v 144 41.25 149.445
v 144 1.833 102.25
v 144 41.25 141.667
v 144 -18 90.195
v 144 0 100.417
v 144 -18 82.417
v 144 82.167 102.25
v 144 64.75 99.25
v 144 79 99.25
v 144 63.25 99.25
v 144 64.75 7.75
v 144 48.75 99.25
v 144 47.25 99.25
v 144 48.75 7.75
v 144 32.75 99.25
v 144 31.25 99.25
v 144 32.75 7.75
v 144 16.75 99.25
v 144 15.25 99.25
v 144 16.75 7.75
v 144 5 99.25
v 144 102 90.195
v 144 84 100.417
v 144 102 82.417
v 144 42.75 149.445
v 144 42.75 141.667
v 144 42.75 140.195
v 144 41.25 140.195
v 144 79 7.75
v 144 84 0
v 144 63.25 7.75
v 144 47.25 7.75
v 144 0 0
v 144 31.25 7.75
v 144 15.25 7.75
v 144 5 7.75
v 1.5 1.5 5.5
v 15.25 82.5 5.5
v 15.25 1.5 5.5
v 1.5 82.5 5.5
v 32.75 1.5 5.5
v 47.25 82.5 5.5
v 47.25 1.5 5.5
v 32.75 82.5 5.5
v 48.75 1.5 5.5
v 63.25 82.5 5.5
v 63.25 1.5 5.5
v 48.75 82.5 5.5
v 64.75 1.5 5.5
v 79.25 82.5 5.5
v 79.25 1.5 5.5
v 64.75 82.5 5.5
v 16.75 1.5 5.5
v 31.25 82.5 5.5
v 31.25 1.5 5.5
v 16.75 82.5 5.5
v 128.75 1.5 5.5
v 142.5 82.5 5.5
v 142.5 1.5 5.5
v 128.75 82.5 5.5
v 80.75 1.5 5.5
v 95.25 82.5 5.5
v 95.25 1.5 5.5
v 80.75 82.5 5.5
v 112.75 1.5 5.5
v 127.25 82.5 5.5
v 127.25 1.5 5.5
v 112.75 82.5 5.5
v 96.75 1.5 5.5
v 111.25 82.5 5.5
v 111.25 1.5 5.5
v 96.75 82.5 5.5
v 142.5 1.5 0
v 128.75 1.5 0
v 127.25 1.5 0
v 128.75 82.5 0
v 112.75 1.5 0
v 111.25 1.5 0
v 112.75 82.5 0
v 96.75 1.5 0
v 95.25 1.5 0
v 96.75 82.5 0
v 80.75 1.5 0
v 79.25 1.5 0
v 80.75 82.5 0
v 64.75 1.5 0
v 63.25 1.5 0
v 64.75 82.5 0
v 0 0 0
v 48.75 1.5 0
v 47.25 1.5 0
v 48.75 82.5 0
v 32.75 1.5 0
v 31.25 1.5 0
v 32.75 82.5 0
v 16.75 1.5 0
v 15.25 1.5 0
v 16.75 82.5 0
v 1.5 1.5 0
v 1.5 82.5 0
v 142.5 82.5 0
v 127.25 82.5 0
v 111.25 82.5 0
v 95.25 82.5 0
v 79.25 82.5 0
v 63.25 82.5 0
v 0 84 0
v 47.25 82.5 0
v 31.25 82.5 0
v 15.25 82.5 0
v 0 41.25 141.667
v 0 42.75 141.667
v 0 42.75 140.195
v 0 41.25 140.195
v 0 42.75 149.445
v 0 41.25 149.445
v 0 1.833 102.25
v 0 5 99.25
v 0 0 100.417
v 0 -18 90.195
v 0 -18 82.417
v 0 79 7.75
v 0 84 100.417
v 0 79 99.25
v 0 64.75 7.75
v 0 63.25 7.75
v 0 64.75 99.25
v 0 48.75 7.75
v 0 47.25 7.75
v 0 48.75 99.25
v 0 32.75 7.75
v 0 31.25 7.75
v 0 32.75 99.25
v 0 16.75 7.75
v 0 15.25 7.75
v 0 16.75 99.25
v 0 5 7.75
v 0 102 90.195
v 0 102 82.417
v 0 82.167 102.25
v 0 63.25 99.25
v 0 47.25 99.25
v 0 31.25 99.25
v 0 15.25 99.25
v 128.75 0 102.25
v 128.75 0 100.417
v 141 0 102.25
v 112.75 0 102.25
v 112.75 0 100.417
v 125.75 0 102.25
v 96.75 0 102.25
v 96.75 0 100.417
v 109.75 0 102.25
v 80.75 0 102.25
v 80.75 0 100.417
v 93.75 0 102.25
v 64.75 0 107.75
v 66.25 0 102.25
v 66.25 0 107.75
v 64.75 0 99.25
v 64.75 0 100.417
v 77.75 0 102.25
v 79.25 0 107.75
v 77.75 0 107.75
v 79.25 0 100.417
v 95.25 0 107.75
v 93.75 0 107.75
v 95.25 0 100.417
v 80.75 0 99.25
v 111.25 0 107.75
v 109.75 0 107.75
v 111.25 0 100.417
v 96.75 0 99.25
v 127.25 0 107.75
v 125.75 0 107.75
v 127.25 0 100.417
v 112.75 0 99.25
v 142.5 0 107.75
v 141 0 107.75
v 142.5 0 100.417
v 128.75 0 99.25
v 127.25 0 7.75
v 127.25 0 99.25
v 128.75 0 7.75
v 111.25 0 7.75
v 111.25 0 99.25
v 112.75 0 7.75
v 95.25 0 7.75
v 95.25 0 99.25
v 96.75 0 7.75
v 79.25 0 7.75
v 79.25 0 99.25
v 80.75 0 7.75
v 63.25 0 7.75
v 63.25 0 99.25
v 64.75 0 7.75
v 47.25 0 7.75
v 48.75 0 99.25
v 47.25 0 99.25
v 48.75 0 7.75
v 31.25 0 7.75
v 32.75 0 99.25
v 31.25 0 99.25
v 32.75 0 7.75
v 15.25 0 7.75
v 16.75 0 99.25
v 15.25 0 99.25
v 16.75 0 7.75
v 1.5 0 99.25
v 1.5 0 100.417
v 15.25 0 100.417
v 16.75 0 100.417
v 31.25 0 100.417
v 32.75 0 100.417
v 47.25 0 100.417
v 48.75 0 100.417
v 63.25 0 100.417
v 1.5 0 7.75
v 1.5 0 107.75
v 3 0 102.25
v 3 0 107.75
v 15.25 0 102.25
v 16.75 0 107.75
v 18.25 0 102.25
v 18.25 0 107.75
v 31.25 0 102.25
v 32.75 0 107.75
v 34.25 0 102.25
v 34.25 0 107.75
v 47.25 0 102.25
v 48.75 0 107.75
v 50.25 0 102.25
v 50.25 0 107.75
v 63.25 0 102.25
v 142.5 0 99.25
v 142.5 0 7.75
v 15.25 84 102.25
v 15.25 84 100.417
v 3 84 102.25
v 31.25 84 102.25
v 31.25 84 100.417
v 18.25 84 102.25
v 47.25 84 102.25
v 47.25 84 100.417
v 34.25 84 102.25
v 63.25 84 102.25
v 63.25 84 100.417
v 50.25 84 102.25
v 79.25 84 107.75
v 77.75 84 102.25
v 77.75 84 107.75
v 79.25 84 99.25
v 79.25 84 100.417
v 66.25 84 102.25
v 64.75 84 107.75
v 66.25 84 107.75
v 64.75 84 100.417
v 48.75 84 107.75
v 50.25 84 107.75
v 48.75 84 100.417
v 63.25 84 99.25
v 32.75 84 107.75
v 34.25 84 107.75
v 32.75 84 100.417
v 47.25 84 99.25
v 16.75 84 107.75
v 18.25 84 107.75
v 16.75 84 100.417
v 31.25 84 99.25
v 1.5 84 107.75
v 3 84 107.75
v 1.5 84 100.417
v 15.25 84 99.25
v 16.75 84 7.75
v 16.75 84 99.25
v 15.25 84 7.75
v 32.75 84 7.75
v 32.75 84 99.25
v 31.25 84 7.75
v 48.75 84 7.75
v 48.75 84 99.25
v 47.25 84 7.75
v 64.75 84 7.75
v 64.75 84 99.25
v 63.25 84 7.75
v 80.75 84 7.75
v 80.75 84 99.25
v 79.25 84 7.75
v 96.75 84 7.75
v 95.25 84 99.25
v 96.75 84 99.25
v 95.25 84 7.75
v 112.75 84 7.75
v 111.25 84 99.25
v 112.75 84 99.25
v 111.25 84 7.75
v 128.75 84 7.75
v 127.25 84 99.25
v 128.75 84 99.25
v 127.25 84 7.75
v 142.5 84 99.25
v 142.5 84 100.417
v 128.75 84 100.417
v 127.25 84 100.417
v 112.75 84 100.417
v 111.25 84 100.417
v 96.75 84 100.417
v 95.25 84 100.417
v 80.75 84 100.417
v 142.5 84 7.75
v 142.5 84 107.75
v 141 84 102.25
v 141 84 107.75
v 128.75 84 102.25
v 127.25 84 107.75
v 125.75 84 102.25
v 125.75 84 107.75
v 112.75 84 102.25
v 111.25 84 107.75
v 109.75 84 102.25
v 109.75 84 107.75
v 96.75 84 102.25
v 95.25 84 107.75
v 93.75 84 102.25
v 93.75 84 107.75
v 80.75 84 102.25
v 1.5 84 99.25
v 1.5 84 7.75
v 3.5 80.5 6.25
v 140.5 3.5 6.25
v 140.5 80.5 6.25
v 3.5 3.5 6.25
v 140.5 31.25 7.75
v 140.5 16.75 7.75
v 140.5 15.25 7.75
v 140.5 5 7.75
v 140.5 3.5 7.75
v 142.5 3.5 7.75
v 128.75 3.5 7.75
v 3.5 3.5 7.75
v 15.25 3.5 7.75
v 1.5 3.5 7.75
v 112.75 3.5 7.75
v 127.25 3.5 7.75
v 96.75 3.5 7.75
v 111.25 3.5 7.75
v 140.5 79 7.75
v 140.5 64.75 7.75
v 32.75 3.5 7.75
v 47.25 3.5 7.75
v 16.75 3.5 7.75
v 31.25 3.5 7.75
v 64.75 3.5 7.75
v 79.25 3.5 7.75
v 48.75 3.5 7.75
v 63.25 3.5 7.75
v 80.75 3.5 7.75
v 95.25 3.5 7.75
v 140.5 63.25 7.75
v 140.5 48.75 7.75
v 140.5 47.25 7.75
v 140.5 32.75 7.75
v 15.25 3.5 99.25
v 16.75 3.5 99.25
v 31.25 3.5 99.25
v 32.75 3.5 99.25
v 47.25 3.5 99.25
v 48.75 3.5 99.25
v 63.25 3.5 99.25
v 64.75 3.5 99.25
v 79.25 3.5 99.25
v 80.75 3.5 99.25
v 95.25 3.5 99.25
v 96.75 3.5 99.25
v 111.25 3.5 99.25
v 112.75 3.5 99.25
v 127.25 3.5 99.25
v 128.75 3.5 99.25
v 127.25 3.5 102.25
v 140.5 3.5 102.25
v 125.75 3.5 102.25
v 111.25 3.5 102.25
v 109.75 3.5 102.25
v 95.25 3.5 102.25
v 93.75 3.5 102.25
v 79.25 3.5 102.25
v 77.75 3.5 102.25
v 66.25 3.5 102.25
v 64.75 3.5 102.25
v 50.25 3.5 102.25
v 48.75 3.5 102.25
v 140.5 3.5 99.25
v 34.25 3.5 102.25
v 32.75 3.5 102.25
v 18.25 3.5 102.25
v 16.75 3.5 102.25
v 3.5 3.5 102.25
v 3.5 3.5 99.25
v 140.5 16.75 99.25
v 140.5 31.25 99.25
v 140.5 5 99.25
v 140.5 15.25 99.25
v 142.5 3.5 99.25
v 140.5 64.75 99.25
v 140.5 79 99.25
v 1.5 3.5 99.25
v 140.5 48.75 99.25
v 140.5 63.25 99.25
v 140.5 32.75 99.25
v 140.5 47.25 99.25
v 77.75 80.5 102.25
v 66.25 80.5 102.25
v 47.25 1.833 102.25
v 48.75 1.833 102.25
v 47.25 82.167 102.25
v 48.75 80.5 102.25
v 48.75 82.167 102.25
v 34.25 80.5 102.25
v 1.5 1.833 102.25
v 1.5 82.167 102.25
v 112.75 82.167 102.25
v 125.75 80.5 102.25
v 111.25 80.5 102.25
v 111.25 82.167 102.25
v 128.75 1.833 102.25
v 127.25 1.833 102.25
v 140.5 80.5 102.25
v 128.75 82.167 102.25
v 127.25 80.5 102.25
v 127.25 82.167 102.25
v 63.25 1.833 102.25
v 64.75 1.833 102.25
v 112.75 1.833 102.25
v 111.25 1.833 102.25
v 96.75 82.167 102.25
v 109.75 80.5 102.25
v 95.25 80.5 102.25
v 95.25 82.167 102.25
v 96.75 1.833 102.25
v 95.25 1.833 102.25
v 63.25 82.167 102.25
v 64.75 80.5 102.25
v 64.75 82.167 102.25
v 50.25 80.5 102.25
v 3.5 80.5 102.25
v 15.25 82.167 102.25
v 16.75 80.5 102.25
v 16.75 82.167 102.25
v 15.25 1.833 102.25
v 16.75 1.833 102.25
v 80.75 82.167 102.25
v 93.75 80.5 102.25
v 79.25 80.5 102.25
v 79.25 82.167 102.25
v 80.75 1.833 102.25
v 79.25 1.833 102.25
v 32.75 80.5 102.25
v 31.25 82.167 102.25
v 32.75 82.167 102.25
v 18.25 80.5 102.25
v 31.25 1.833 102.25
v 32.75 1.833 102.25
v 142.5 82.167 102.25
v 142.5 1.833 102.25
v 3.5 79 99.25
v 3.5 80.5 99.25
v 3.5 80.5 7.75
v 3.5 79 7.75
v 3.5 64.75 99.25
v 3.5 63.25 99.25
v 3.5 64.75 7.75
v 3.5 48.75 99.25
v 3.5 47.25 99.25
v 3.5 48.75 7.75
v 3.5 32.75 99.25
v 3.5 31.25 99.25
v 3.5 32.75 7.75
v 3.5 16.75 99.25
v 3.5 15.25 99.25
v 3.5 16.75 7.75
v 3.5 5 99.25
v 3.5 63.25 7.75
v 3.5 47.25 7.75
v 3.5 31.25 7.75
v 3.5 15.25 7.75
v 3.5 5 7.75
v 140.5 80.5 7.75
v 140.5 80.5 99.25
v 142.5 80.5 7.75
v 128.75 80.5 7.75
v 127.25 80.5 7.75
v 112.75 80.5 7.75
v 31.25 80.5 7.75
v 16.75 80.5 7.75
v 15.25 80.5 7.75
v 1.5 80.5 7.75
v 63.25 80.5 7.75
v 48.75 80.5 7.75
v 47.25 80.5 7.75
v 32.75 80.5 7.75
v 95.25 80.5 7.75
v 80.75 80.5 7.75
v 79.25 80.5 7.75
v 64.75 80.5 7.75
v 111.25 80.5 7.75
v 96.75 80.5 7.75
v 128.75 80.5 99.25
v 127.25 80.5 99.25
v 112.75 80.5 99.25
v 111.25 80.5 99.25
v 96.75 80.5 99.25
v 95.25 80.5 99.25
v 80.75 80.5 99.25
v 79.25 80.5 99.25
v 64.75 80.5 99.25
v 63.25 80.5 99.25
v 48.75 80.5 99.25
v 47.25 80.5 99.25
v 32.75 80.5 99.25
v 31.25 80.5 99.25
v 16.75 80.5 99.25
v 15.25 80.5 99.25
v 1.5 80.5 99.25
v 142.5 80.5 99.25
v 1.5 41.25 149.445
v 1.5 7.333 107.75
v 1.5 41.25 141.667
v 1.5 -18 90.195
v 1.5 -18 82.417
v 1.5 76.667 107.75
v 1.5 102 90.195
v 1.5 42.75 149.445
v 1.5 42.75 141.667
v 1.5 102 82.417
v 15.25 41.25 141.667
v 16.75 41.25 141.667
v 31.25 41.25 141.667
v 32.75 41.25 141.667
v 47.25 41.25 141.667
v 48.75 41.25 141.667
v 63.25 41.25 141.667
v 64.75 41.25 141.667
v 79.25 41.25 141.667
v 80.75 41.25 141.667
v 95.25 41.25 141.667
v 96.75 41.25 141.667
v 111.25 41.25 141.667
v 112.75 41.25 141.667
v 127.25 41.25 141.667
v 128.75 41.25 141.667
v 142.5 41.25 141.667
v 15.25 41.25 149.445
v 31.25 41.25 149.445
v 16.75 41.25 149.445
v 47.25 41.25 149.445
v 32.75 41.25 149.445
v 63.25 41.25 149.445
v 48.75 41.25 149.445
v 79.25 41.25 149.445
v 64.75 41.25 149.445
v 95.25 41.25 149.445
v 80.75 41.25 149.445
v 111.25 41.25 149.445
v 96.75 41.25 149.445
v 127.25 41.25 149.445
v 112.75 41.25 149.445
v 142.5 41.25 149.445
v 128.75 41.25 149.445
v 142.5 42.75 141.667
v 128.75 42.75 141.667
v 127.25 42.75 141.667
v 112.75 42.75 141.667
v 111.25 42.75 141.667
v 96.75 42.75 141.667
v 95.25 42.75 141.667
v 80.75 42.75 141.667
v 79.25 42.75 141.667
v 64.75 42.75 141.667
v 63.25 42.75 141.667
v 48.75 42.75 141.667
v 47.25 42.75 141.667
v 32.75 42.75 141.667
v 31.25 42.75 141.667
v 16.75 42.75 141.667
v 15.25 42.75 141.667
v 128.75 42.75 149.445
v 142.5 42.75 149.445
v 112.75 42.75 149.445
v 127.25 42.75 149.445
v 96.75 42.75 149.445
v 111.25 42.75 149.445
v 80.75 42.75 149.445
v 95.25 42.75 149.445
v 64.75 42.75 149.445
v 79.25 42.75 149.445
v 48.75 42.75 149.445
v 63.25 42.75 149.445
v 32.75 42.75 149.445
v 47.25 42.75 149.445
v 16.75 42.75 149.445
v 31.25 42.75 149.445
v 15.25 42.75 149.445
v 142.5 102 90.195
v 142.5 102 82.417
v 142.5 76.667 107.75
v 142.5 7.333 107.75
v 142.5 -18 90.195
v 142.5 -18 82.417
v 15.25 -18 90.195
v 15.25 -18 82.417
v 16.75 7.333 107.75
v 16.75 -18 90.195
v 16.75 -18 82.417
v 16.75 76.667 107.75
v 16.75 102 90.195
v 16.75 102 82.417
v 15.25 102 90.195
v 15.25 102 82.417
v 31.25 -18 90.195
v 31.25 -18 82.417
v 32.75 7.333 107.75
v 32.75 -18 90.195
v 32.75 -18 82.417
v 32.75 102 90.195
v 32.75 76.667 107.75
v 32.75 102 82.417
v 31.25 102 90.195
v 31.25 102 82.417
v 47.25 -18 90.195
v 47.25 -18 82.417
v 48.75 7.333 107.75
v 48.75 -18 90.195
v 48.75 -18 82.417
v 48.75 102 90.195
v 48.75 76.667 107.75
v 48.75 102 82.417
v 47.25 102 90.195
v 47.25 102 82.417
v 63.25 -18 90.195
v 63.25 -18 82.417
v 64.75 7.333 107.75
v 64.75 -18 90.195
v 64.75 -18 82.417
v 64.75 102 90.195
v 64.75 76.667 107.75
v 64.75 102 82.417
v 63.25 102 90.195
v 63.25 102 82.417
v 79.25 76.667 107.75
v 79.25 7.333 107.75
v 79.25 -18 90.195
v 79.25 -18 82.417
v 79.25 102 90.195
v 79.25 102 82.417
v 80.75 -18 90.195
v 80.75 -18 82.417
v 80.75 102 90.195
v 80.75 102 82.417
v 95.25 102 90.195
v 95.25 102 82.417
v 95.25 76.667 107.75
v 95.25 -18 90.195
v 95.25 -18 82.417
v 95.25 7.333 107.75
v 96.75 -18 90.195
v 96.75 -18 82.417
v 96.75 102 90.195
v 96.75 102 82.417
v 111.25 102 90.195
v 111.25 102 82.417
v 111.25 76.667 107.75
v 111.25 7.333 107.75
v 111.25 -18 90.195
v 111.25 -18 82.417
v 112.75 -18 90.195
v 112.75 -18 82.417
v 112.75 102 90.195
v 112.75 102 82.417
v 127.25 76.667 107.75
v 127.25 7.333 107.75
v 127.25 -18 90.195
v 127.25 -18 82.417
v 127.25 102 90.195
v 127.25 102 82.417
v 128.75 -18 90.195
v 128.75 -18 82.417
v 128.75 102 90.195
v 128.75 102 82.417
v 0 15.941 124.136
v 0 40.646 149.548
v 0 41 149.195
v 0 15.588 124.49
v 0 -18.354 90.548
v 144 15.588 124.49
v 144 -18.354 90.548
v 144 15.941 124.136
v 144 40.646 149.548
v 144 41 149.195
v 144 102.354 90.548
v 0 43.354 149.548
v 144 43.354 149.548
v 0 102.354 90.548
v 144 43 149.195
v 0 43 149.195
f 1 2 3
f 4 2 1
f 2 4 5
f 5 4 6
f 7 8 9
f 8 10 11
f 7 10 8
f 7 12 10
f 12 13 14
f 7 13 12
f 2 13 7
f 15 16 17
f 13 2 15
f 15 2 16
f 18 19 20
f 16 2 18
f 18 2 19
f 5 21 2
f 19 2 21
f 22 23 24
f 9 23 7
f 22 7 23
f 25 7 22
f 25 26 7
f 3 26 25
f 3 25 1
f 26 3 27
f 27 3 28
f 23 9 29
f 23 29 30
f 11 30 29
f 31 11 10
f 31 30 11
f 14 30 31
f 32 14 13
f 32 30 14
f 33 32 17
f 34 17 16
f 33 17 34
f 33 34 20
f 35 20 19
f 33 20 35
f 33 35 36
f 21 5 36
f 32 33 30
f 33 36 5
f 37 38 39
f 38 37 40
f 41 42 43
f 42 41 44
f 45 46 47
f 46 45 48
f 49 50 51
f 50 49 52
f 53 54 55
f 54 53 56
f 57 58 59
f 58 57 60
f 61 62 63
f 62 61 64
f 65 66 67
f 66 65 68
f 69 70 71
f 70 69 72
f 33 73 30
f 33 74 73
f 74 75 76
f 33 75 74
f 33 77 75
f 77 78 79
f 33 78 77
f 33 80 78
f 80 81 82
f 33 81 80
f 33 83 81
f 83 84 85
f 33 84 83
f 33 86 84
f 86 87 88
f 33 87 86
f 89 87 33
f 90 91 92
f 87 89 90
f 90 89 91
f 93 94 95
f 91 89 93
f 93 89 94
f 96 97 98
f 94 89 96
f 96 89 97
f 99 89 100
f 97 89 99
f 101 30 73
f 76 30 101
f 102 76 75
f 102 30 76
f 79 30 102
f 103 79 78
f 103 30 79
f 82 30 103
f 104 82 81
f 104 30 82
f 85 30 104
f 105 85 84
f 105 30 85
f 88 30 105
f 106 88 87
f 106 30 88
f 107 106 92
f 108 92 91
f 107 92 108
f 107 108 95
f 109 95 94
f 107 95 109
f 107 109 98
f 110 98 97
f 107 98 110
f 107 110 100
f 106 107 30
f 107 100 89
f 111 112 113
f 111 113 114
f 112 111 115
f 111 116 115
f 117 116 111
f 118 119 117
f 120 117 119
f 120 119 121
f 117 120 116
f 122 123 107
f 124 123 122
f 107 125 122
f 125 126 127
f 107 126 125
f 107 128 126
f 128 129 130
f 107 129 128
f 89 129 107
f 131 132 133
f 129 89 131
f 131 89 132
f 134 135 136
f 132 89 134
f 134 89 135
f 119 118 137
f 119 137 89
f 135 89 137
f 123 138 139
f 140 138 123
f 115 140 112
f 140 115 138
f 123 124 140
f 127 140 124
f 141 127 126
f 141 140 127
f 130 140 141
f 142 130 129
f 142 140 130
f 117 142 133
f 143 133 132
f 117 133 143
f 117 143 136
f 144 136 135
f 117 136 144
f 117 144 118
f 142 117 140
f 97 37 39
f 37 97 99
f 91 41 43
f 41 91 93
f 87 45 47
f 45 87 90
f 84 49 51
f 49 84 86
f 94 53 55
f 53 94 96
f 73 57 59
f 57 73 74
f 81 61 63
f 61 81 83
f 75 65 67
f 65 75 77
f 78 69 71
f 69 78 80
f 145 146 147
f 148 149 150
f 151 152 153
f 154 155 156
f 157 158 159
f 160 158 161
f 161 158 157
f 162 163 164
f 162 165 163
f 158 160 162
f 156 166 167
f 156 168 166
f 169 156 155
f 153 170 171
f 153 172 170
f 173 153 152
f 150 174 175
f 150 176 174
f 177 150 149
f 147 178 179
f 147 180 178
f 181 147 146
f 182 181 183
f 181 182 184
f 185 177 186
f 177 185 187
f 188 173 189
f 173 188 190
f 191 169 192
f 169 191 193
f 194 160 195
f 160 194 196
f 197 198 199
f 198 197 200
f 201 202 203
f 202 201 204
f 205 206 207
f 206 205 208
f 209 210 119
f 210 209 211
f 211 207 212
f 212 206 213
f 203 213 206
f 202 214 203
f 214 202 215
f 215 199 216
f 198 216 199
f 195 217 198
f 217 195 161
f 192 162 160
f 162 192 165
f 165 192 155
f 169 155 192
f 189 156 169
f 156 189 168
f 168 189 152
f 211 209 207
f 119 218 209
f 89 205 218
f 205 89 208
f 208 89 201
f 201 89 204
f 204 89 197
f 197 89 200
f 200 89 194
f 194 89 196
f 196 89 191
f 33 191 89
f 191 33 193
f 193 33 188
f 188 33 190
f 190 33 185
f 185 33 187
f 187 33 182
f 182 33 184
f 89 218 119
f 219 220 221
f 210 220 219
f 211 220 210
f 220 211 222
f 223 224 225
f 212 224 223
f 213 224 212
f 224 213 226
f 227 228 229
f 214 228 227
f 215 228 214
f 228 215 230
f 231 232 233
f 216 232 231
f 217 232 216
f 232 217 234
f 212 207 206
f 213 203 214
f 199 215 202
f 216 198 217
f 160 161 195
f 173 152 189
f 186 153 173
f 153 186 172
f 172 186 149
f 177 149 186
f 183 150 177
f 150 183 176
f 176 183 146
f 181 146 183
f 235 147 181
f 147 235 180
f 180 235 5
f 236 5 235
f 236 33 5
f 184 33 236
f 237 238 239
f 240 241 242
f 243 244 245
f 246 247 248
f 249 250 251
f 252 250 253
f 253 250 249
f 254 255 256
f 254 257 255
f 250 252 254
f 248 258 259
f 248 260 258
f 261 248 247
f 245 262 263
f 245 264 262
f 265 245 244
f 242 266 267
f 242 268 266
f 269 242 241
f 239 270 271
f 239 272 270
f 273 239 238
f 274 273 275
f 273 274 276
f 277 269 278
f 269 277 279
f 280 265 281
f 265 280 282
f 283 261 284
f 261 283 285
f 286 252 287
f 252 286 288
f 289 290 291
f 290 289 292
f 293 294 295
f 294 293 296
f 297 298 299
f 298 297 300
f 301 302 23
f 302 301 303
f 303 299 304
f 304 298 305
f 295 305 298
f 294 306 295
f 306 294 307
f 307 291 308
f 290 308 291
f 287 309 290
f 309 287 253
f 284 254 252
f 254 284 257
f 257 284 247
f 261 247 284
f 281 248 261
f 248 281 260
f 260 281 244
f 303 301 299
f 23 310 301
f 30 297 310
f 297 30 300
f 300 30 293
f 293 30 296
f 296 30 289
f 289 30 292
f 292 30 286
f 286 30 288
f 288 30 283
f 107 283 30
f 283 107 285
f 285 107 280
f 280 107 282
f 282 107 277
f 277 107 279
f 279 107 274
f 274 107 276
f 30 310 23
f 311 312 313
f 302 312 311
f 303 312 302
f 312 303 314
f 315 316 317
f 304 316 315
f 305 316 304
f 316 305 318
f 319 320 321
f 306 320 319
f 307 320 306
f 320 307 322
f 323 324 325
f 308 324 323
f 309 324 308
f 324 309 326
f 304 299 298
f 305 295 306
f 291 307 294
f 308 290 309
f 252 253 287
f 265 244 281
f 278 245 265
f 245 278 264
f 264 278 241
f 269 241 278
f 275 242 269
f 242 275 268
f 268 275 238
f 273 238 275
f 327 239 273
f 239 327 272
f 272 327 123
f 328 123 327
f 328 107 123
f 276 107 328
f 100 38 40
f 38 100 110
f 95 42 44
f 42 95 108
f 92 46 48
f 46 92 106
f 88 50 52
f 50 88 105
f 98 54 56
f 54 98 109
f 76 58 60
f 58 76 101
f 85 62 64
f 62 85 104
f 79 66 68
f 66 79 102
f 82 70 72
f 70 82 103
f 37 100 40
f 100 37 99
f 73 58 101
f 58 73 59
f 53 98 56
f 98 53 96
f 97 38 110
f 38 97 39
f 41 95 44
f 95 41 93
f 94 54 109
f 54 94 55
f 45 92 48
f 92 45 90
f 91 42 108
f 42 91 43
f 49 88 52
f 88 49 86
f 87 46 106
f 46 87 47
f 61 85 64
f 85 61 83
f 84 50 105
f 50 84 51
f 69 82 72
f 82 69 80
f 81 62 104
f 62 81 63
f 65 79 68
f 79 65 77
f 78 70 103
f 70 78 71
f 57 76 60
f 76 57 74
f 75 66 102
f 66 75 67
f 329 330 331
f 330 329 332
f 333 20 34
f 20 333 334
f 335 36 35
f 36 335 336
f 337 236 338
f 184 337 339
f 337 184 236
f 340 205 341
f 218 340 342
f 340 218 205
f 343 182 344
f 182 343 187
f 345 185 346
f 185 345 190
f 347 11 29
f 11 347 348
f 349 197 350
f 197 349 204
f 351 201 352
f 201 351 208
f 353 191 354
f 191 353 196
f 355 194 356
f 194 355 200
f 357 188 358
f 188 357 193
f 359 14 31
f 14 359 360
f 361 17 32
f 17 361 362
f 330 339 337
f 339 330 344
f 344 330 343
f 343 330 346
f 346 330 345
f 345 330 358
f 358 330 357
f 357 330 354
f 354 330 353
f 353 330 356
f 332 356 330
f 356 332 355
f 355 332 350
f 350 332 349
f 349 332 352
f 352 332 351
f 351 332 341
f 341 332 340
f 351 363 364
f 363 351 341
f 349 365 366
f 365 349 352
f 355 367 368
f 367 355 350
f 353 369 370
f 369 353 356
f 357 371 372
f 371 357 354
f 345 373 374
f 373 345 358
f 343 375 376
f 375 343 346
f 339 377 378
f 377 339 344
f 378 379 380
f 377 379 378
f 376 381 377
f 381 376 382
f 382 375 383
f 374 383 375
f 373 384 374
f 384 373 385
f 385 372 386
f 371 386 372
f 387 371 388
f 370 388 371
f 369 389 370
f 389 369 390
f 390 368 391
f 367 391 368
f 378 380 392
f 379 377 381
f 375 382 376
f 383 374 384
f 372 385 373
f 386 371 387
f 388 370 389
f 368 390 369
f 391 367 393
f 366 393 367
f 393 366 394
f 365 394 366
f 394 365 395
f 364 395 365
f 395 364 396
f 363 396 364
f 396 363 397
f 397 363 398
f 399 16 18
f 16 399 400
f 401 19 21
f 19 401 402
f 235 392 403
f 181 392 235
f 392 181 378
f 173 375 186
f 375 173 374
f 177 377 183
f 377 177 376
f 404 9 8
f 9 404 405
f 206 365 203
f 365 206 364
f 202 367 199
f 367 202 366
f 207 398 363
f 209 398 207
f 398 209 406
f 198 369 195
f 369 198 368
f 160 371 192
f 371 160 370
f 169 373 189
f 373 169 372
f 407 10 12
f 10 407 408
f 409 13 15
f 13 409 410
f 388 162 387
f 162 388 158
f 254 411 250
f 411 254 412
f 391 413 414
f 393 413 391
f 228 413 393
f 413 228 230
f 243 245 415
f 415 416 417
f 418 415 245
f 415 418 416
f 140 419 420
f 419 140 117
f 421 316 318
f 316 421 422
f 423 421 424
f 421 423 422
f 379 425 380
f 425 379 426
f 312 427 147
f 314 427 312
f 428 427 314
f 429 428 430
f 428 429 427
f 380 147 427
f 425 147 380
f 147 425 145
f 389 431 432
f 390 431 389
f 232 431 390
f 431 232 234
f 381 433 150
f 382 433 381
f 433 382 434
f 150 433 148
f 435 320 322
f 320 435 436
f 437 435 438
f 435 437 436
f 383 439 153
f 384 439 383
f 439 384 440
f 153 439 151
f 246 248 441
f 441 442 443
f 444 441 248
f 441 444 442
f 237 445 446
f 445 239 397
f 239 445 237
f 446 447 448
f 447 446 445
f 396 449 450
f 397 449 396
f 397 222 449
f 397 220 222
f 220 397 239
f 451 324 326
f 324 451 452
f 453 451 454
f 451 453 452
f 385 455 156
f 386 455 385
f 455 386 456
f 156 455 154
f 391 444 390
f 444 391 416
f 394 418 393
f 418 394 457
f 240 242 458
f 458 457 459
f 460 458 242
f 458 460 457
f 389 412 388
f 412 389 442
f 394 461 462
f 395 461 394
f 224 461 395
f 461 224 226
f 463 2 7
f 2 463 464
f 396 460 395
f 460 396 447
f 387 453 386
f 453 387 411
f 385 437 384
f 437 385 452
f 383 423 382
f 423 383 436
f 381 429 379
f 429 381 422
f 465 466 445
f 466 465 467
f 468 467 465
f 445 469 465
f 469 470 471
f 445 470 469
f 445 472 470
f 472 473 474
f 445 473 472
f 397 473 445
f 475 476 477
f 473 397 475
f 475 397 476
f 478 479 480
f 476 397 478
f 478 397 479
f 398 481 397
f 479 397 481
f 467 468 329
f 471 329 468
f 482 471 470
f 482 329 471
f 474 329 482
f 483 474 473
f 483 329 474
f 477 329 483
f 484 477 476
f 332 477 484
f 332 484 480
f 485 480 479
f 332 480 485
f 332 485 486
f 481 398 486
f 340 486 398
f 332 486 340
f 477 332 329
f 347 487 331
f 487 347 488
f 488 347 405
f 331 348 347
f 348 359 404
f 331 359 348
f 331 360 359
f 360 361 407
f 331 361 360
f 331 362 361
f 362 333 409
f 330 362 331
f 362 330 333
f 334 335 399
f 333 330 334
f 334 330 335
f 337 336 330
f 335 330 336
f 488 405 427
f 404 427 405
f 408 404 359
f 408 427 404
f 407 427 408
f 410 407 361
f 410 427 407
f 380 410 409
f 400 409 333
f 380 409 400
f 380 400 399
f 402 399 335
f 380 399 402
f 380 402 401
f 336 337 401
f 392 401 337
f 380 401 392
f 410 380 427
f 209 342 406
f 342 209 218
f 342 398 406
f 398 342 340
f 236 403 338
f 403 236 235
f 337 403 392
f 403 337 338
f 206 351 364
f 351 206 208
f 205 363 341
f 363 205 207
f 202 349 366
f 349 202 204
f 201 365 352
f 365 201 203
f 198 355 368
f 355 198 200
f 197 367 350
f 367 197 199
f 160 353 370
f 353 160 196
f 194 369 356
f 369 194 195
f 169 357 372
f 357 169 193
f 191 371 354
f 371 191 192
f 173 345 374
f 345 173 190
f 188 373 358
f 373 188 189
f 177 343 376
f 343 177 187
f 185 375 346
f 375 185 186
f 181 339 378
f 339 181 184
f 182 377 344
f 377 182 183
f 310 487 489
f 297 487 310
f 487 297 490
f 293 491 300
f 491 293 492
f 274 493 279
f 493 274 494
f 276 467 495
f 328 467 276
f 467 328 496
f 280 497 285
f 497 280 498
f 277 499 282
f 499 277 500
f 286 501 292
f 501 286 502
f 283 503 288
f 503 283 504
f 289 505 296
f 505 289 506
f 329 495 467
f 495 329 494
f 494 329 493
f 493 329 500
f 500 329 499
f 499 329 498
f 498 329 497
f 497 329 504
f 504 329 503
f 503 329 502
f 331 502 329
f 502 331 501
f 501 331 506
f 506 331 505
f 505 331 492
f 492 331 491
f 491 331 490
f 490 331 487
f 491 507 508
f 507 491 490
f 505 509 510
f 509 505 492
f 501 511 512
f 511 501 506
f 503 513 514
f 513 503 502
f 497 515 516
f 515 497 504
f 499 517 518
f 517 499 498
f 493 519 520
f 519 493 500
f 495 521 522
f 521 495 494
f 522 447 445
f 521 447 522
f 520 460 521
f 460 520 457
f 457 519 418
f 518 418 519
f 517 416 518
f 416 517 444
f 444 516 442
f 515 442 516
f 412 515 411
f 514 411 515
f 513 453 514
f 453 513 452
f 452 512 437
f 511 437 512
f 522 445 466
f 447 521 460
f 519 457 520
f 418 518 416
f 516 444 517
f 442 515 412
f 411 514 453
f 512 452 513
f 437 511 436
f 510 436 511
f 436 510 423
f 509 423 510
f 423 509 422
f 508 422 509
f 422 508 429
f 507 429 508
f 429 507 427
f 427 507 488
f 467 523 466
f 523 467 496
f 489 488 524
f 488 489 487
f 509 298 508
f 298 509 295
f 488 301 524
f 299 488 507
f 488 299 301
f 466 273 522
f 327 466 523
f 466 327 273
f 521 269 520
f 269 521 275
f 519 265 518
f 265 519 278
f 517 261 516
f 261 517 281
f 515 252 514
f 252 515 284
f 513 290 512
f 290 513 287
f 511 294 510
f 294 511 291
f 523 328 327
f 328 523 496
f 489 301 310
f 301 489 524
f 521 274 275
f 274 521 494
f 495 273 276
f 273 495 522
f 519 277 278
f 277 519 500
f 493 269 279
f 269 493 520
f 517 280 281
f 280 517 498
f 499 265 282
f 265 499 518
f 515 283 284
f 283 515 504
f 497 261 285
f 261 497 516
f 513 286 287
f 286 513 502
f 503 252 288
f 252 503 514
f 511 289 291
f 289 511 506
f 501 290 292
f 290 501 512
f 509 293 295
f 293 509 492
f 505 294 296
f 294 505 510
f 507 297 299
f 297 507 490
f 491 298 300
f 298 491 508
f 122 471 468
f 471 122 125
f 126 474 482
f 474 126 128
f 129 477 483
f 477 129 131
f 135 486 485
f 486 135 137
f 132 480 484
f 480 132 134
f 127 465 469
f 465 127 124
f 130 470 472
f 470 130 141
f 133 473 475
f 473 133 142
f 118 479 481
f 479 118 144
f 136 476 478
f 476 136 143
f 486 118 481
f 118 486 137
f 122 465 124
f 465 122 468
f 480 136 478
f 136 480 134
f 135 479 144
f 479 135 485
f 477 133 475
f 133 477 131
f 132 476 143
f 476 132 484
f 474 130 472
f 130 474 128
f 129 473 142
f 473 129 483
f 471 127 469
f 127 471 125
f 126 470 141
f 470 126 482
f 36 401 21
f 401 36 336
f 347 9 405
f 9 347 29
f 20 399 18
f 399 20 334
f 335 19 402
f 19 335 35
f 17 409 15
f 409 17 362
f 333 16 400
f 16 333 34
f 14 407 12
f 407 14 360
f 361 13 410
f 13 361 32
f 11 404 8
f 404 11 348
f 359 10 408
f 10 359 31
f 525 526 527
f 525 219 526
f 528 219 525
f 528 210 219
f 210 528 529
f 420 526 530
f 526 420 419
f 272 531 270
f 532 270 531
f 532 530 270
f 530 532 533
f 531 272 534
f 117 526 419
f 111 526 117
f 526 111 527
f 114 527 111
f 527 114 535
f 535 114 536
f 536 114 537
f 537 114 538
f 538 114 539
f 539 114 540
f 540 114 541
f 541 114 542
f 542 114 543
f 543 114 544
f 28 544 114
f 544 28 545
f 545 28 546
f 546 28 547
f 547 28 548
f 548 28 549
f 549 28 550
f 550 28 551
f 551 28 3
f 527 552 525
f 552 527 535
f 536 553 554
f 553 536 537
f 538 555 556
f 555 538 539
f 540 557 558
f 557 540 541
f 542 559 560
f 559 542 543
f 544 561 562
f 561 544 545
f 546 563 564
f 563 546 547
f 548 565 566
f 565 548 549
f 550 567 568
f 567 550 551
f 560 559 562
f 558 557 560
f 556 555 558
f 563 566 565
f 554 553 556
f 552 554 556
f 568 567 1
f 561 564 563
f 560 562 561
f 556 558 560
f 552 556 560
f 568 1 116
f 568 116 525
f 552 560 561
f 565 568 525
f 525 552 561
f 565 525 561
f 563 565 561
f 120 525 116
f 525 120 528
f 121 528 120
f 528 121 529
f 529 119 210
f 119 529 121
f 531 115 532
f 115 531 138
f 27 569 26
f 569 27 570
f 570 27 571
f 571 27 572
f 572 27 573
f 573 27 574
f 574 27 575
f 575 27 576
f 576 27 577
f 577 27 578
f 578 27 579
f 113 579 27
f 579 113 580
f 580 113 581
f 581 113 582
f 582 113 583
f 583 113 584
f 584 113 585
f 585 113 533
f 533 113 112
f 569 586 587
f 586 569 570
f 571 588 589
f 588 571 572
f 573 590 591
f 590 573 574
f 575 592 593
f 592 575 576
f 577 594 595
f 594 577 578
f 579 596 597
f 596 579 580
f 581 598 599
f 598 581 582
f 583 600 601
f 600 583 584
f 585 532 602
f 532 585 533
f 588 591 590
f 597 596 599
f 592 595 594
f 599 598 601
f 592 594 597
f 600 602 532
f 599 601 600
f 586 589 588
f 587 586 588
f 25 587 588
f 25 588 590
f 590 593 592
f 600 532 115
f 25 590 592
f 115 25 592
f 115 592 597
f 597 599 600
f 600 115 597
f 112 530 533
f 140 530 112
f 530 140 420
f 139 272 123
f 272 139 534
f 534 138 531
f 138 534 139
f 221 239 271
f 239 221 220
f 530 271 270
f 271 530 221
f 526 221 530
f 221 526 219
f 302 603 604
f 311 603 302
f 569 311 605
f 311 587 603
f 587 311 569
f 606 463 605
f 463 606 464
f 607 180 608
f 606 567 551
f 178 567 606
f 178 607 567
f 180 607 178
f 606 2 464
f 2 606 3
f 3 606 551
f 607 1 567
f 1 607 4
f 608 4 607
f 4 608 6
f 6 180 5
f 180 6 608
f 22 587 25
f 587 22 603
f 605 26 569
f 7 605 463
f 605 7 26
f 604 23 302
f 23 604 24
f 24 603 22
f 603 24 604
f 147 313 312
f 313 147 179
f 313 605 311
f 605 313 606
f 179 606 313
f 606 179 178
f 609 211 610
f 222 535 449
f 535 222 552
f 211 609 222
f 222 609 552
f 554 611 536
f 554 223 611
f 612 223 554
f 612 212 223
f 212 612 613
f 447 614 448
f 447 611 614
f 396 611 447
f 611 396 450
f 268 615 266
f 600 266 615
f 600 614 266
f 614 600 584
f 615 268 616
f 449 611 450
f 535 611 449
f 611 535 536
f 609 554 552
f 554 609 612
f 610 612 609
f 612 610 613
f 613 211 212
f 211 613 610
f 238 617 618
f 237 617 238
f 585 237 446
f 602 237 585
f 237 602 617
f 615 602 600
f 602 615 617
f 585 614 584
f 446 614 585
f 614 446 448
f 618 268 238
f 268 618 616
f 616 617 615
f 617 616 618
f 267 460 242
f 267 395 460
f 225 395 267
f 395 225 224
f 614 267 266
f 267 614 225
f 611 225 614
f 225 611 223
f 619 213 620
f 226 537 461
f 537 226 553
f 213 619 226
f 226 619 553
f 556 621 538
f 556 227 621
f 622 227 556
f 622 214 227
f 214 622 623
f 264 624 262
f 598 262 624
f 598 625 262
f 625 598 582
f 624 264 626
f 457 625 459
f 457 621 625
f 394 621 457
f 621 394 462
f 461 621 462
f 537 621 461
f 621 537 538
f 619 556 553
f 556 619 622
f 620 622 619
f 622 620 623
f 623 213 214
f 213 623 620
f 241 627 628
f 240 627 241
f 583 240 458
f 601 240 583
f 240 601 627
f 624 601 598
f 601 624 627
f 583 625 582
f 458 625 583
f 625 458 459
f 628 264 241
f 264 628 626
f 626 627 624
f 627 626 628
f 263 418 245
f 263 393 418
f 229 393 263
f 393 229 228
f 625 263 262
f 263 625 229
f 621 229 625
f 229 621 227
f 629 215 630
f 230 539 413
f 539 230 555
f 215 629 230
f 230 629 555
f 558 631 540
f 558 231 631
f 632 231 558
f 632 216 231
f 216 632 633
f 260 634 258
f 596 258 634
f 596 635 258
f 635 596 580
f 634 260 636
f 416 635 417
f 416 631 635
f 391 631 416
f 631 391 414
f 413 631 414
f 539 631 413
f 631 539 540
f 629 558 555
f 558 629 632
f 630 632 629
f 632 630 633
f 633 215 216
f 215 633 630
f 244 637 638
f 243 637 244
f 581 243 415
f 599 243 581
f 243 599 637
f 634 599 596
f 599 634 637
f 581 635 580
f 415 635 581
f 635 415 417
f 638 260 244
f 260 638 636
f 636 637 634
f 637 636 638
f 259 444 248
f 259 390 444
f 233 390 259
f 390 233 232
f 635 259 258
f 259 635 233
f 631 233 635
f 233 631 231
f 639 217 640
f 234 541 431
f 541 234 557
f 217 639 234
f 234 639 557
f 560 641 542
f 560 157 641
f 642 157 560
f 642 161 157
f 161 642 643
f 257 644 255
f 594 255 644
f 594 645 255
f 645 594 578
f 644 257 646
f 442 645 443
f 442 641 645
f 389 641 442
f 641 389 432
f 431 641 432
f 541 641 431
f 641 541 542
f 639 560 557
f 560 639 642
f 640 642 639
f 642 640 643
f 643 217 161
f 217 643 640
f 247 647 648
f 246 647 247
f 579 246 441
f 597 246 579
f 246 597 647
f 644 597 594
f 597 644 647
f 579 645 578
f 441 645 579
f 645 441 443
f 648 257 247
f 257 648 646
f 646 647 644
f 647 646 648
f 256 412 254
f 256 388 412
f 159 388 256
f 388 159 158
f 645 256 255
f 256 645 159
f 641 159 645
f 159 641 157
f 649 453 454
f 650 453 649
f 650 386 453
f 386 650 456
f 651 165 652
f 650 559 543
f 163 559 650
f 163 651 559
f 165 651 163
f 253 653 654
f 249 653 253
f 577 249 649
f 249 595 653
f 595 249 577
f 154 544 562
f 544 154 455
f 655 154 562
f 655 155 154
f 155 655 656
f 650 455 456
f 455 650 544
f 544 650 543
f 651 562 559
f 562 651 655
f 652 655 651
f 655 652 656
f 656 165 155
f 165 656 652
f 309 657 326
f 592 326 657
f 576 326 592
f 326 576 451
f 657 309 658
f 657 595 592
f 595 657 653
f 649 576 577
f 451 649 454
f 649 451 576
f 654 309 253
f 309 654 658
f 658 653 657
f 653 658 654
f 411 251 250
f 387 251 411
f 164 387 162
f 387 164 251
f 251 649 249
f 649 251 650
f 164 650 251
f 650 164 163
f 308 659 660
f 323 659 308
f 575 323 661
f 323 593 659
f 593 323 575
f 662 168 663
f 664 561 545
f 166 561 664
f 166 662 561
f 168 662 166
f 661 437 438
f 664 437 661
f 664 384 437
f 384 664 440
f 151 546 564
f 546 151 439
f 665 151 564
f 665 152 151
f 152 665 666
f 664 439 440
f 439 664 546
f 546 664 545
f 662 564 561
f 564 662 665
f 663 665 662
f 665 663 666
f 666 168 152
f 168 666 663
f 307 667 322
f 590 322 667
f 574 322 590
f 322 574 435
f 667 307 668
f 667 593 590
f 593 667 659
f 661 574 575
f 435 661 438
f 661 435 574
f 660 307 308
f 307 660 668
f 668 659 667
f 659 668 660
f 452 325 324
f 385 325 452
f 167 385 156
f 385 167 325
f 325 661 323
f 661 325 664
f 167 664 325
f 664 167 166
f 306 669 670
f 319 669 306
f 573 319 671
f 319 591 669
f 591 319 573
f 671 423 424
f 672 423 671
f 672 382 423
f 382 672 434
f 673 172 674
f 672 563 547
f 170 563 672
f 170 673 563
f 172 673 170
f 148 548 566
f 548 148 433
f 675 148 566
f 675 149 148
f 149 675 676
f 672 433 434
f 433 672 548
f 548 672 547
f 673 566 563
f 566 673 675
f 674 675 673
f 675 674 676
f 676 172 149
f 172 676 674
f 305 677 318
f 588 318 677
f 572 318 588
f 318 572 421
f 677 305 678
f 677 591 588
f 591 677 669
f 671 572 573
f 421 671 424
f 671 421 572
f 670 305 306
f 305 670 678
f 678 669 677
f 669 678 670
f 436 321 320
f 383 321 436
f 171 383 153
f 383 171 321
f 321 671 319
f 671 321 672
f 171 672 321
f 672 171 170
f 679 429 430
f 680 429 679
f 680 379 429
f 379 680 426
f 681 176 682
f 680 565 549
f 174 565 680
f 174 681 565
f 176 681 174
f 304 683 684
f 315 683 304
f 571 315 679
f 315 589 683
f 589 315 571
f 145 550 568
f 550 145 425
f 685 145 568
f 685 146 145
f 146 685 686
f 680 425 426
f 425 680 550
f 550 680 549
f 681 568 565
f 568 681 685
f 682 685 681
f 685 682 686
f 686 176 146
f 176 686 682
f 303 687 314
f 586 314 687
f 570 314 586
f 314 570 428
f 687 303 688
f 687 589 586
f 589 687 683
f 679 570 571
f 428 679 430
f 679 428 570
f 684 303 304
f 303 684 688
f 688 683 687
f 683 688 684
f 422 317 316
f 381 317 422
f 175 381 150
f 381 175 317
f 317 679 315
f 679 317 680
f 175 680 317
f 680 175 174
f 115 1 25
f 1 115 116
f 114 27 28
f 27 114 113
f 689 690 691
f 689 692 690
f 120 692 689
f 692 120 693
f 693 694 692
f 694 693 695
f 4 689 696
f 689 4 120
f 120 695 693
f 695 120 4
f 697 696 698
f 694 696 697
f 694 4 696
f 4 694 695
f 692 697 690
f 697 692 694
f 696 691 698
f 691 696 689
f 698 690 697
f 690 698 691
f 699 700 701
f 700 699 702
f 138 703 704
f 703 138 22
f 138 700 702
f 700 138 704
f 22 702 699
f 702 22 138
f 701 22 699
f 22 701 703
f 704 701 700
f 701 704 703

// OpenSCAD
// file: ../src/roof.scad
// roof.scad: a gable roof over the walls.
//
// Rafters in pairs sit over the studs, one flush with each end wall. Each
// rafter has a birdsmouth seat on the wall's top plate, a plumb cut against
// the ridge board and a plumb-cut tail at the eave. A ceiling joist beside
// each pair ties the walls together, its ends cut to the roof's slope.
// Sheathing covers both slopes up to a ridge vent gap.
//
// In each rafter's profile, y runs across the house and z is height; h_top
// is the top of the wall's top plates.

function slope(pitch) = atan(pitch / 12);
// The seat is as wide as the wall, but the notch above it no deeper than a
// third of the rafter.
function seat_len(pitch, rafter, wall) = min(wall, depth(rafter) / 3 / (pitch / 12));
// The ridge board: the first size deeper than the rafter's plumb cut.
function ridge_stock(pitch, rafter) =
    let (plumb = depth(rafter) / cos(slope(pitch)))
    [for (l = LUMBER) if (l[2] >= plumb && l[2] > depth(rafter)) l[0]][0];

// Height of the rafter's lower and upper edges at y, on the front slope.
function rafter_bottom(y, h_top, pitch, seat) = h_top + (y - seat) * pitch / 12;
function rafter_top(y, h_top, pitch, seat, rafter) =
    rafter_bottom(y, h_top, pitch, seat) + depth(rafter) / cos(slope(pitch));

// x of each rafter pair: flush at both ends, the rest on centres, leaving
// room for the ties at the ends.
function rafter_xs(length, t, spacing) =
    concat([0, length - t], [for (c = on_centre(0, length, spacing, 2.5 * t)) c - t / 2]);

function roof_frame(length, width, h_top, wall, rafter, pitch, overhang, spacing, max_len) =
    let (
        t = thickness(rafter),
        d = depth(rafter),
        k = pitch / 12,
        seat = seat_len(pitch, rafter, wall),
        ridge = ridge_stock(pitch, rafter),
        y_ridge = width / 2 - thickness(ridge) / 2,
        bot = function(y) rafter_bottom(y, h_top, pitch, seat),
        top = function(y) rafter_top(y, h_top, pitch, seat, rafter),
        front = concat(
            overhang > 0 ? [[-overhang, bot(-overhang)]] : [],
            [[0, bot(0)], [0, h_top], [seat, h_top], [y_ridge, bot(y_ridge)], [y_ridge, top(y_ridge)], [-overhang, top(-overhang)]]
        ),
        back = [for (p = front) [width - p[0], p[1]]],
        rafter_len = (y_ridge + overhang) / cos(slope(pitch)),
        // Ties: rafter stock on the top plates, ends cut under the roof line.
        z_tie = h_top + d,
        z_end = top(0),
        y_cut = z_end >= z_tie ? 0 : (z_tie - z_end) / k,
        tie = z_end >= z_tie ? [[0, h_top], [width, h_top], [width, z_tie], [0, z_tie]]
        : [[0, h_top], [width, h_top], [width, z_end], [width - y_cut, z_tie], [y_cut, z_tie], [0, z_end]],
        tie_x = function(x) x == 0 ? t : x == length - t ? length - 2 * t : x + t / 2 < length / 2 ? x + t : x - t
    )
    concat(
        [
            for (x = rafter_xs(length, t, spacing)) each [
                ["prism", rafter, "roof", [x, t, rafter_len], front],
                ["prism", rafter, "roof", [x, t, rafter_len], back],
                ["prism", rafter, "ties", [tie_x(x), t, width], tie],
            ],
        ],
        [
            for (p = splice(0, length, max_len, spacing))
            box(ridge, "roof", [p[0], y_ridge, top(y_ridge) - depth(ridge)], [p[1] - p[0], thickness(ridge), depth(ridge)]),
        ]
    );

// Sheathing on both slopes, in 4' rows up from the eave, every other row
// shifted 4' so its joints land on rafters. It stops `vent` short of the
// ridge on each side.
function roof_sheathing(length, width, h_top, wall, rafter, pitch, overhang, sheet, vent) =
    let (
        seat = seat_len(pitch, rafter, wall),
        run = (width / 2 - vent + overhang) / cos(slope(pitch)),
        rows = ceil(run / SHEET_W - 1e-9),
        frame = function(flip) [-overhang, rafter_top(-overhang, h_top, pitch, seat, rafter), slope(pitch), flip, width]
    )
    [
            for (flip = [false, true], r = [0:1:rows - 1], p = staggered(0, length, r % 2 * SHEET_W))
            ["slab", sheet, "roof sheathing", [p[0], p[1] - p[0], r * SHEET_W, min(SHEET_W, run - r * SHEET_W)], frame(flip)],
    ];
// file: ../src/walls.scad
// walls.scad: four stud walls on the floor.
//
// The front and back walls run the full length; the end walls fit between
// them. Each has a bottom plate, studs flush at both ends and on centres
// between, and a double top plate. The upper top plates of the end walls run
// the full width and lap over the long walls, and every upper plate joint
// sits half a piece along from the joints below it.

function walls(length, width, z0, height, stud, spacing, max_len) =
    let (
        t = thickness(stud),
        w = depth(stud),
        h = height - 3 * t,
        z_top = z0 + t + h
    )
    concat(
        // Front and back
        [
            for (y = [0, width - w]) each concat(
                [
                    for (p = splice(0, length, max_len, spacing), z = [z0, z_top])
                    box(stud, "walls", [p[0], y, z], [p[1] - p[0], w, t]),
                ],
                [
                    for (p = splice(w, length - w, max_len, spacing, true))
                    box(stud, "walls", [p[0], y, z_top + t], [p[1] - p[0], w, t]),
                ],
                [
                    for (x = concat([0, length - t], [for (c = on_centre(0, length, spacing)) c - t / 2]))
                    box(stud, "walls", [x, y, z0 + t], [t, w, h]),
                ]
            ),
        ],
        // Ends
        [
            for (x = [0, length - w]) each concat(
                [
                    for (p = splice(w, width - w, max_len, spacing), z = [z0, z_top])
                    box(stud, "walls", [x, p[0], z], [w, p[1] - p[0], t]),
                ],
                [
                    for (p = splice(0, width, max_len, spacing, true))
                    box(stud, "walls", [x, p[0], z_top + t], [w, p[1] - p[0], t]),
                ],
                [
                    for (y = concat([w, width - w - t], [for (c = on_centre(w, width - w, spacing)) c - t / 2]))
                    box(stud, "walls", [x, y, z0 + t], [w, t, h]),
                ]
            ),
        ]
    );
// file: ../src/floor.scad
// floor.scad: the floor platform and its sheathing.
//
// Rim joists run the length of the house, spliced over a joist where the
// stock runs out. Joists span its width between them: one flush at each end,
// the rest on centres from the house's end. Sheathing runs across the joists
// in 4' rows, every other row shifted 4', so each end joint lands on a joist.

function floor_frame(length, width, joist, spacing, max_len) =
    let (t = thickness(joist), d = depth(joist))
    concat(
        [
            for (y = [0, width - t], p = splice(0, length, max_len, spacing))
            box(joist, "floor", [p[0], y, 0], [p[1] - p[0], t, d]),
        ],
        [
            for (x = concat([0, length - t], [for (c = on_centre(0, length, spacing)) c - t / 2]))
            box(joist, "floor", [x, t, 0], [t, width - 2 * t, d]),
        ]
    );

function floor_sheathing(length, width, z, sheet) =
    let (rows = ceil(width / SHEET_W - 1e-9))
    [
            for (r = [0:1:rows - 1], p = staggered(0, length, r % 2 * SHEET_W))
            box(sheet, "subfloor", [p[0], r * SHEET_W, z], [p[1] - p[0], min(SHEET_W, width - r * SHEET_W), thickness(sheet)]),
    ];
// file: ../src/lumber.scad
// lumber.scad: stock sizes, layout rules, members and the cut list.
//
// Every part of the house is a member, a list that both draws it and counts
// it in the cut list:
//   ["box", stock, layer, min, size]
//       an axis-aligned stick or sheet, from corner `min`, `size` across
//   ["prism", stock, layer, [x0, w, length], profile]
//       a profile in the y-z plane, `w` thick along x from x0; `length` is
//       the stock it is cut from
//   ["slab", stock, layer, [x0, w, s0, sl], [y0, z0, angle, flip, width]]
//       a sheet on a roof slope: `w` along x from x0 and `sl` up the slope
//       from s0, in a frame at (y0, z0) tilted by `angle`; `flip` mirrors it
//       to the back slope of a house `width` deep
// All sizes are in inches.

// Actual sizes of nominal lumber: [name, thickness, depth]
LUMBER = [
    ["2x4", 1.5, 3.5],
    ["2x6", 1.5, 5.5],
    ["2x8", 1.5, 7.25],
    ["2x10", 1.5, 9.25],
    ["2x12", 1.5, 11.25],
];
// 4' x 8' sheet goods: [name, thickness]
SHEETS = [["ply 3/4", 0.75], ["ply 1/2", 0.5]];
SHEET_W = 48;
SHEET_L = 96;

LAYER_COLOURS = [
    ["floor", "BurlyWood"],
    ["subfloor", "Tan"],
    ["walls", "Wheat"],
    ["roof", "Peru"],
    ["ties", "SandyBrown"],
    ["roof sheathing", "Sienna"],
];

function row(table, name) = table[search([name], table)[0]];
function is_sheet(name) = len([for (s = SHEETS) if (s[0] == name) 1]) > 0;
function is_lumber(name) = len([for (s = LUMBER) if (s[0] == name) 1]) > 0;
function thickness(name) = is_sheet(name) ? row(SHEETS, name)[1] : row(LUMBER, name)[1];
function depth(name) = row(LUMBER, name)[2];

// ---------------- Layout ----------------
// Centres of the members between two end members flush at a and b, on a grid
// of `spacing` measured from 0, at least `clear` in from either end.
function on_centre(a, b, spacing, clear = 2.25) =
    [for (k = [ceil((a + clear) / spacing):1:floor((b - clear) / spacing)]) k * spacing];

// A run from a to b in pieces no longer than max_len. Joints fall on the
// grid, every `piece`, so each lands on a member below or beside it. No end
// piece is shorter than two grid spaces: a joint closer to an end is
// dropped, and `piece` leaves room for that. `shifted` moves the joints half
// a piece along, for a second layer over the first. Returns [[start, end], ...].
function splice(a, b, max_len, spacing, shifted = false) =
    let (
        clear = 2 * spacing,
        piece = floor((max_len - clear) / spacing) * spacing,
        phase = shifted ? round(piece / 2 / spacing) * spacing : 0,
        joints = [for (k = [ceil((a + clear - phase) / piece):1:floor((b - clear - phase) / piece)]) phase + k * piece],
        ends = concat([a], joints, [b])
    )
    [for (i = [0:1:len(ends) - 2]) [ends[i], ends[i + 1]]];

// Sheets along a run, joined at `offset` and every 8' after it.
function staggered(a, b, offset) =
    let (
        joints = [for (x = [offset:SHEET_L:b]) if (x > a + 1e-6 && x < b - 1e-6) x],
        ends = concat([a], joints, [b])
    )
    [for (i = [0:1:len(ends) - 2]) [ends[i], ends[i + 1]]];

function box(stock, layer, min, size) = ["box", stock, layer, min, size];

// ---------------- Drawing ----------------
module draw(m) {
    color(row(LAYER_COLOURS, m[2])[1]) if (m[0] == "box")
        translate(m[3]) cube(m[4]);
    else if (m[0] == "prism")
        translate([m[3][0], 0, 0]) rotate([90, 0, 90]) linear_extrude(m[3][1]) polygon(m[4]);
    else if (m[0] == "slab") {
        f = m[4];
        p = m[3];
        mirror_back(f[3], f[4]) translate([p[0], f[0], f[1]]) rotate([f[2], 0, 0]) translate([0, p[2], 0])
                        cube([p[1], p[3], thickness(m[1])]);
    }
}

module mirror_back(flip, width) {
    if (flip)
        translate([0, width, 0]) mirror([0, 1, 0]) children();
    else
        children();
}

// ---------------- Cut list ----------------
function stick_length(m) = m[0] == "box" ? max(m[4]) : m[3][2];
function stock_length(l, lengths) = min([for (s = lengths) if (s >= l - 1e-6) s]);
function join(v, sep = ", ", i = 0) = i >= len(v) ? "" : str(v[i], i < len(v) - 1 ? sep : "", join(v, sep, i + 1));
function sorted(v) =
    len(v) <= 1 ? v
    : let (p = v[0], rest = [for (i = [1:1:len(v) - 1]) v[i]])
    concat(sorted([for (x = rest) if (x < p) x]), [p], sorted([for (x = rest) if (x >= p) x]));
function distinct(v) = [for (i = [0:1:len(v) - 1]) if (len([for (j = [0:1:i - 1]) if (v[j] == v[i]) 1]) == 0) v[i]];

// The stock to buy, one stick per piece with no reuse of offcuts, then each
// cut length; the sheet count, one sheet per piece.
module cut_list(members, lengths) {
    for (l = LUMBER) {
        cuts = [for (m = members) if (m[1] == l[0]) round(stick_length(m) * 8) / 8];
        if (len(cuts) > 0) {
            buy = [for (s = lengths) let (n = len([for (c = cuts) if (stock_length(c, lengths) == s) 1])) if (n > 0) str(n, " @ ", s / 12, "'")];
            echo(str("Buy ", l[0], ": ", join(buy)));
            kinds = sorted(distinct(cuts));
            echo(str("  cut ", l[0], ": ", join([for (k = kinds) str(len([for (c = cuts) if (c == k) 1]), " x ", k, " in")])));
        }
    }
    for (s = SHEETS) {
        n = len([for (m = members) if (m[1] == s[0]) 1]);
        if (n > 0) echo(str("Buy ", s[0], ": ", n, " sheets"));
    }
}
// file: ../src/house.scad
// house.scad: The Tiny, a parametric tiny house frame.
//
// A floor platform, four stud walls and a gable roof, sized from the
// parameters below, with a cut list of the lumber and sheets to buy in the
// console. All sizes are in inches.

include <lumber.scad>
include <floor.scad>
include <walls.scad>
include <roof.scad>

/* [House] */
// Outside length, along the ridge (in)
length = 240;
// Outside width (in)
width = 96;
// Wall framing height, bottom plate to the top of the top plates (in)
wall_height = 96;

/* [Framing] */
// Distance between joist, stud and rafter centres (in)
spacing = 16; // [12, 16, 24]
joist = "2x6"; // [2x6, 2x8, 2x10, 2x12]
stud = "2x4"; // [2x4, 2x6]
rafter = "2x6"; // [2x4, 2x6, 2x8, 2x10]
// Lumber lengths you can buy (ft)
stock_feet = [8, 10, 12, 14, 16];

/* [Roof] */
// Rise per 12 in of run
pitch = 6;
// Eave overhang, measured level from the wall (in)
overhang = 12;
// Gap left open in the sheathing each side of the ridge (in)
ridge_vent = 1;

/* [Sheathing] */
subfloor = "ply 3/4"; // [ply 3/4, ply 1/2]
roof_sheet = "ply 1/2"; // [ply 1/2, ply 3/4]

/* [Show] */
show_floor = true;
show_subfloor = true;
show_walls = true;
show_roof = true;
show_roof_sheathing = true;
// "house" draws the house; "none" draws nothing, for including this file
part = "house"; // [house, none]
// Echo every member, for the checks
list_members = false;

LENGTHS = stock_feet * 12;
MAX_LEN = max(LENGTHS);

assert(MAX_LEN >= 96, "stock_feet must include a length of at least 8 ft");
assert(spacing == 12 || spacing == 16 || spacing == 24, "spacing must be 12, 16 or 24 in, so sheet joints land on framing");
assert(pitch > 0 && overhang >= 0 && ridge_vent >= 0, "pitch must be positive, overhang and ridge_vent not negative");
assert(is_lumber(joist) && is_lumber(stud) && is_lumber(rafter), "joist, stud and rafter must be sizes in LUMBER");
assert(is_sheet(subfloor) && is_sheet(roof_sheet), "subfloor and roof_sheet must be sizes in SHEETS");
assert(!is_undef(ridge_stock(pitch, rafter)), str("no ridge board in LUMBER is deep enough for ", rafter, " rafters at ", pitch, "/12"));

Z_SUBFLOOR = depth(joist);
Z_WALLS = Z_SUBFLOOR + thickness(subfloor);
H_TOP = Z_WALLS + wall_height;
WALL = depth(stud);
SEAT = seat_len(pitch, rafter, WALL);
RIDGE = ridge_stock(pitch, rafter);
RIDGE_TOP = rafter_top(width / 2 - thickness(RIDGE) / 2, H_TOP, pitch, SEAT, rafter);

assert(RIDGE_TOP - depth(RIDGE) >= H_TOP + depth(rafter), "the roof is too low for the ceiling ties to pass under the ridge board: raise the pitch or widen the house");

MEMBERS = concat(
    floor_frame(length, width, joist, spacing, MAX_LEN),
    floor_sheathing(length, width, Z_SUBFLOOR, subfloor),
    walls(length, width, Z_WALLS, wall_height, stud, spacing, MAX_LEN),
    roof_frame(length, width, H_TOP, WALL, rafter, pitch, overhang, spacing, MAX_LEN),
    roof_sheathing(length, width, H_TOP, WALL, rafter, pitch, overhang, roof_sheet, ridge_vent)
);

TOO_LONG = [for (m = MEMBERS) if (!is_sheet(m[1]) && stick_length(m) > MAX_LEN + 1e-6) [m[1], m[2], stick_length(m)]];
assert(
    len(TOO_LONG) == 0, str(
        "pieces longer than the longest stock (", MAX_LEN / 12, "'): ", TOO_LONG,
        ". Add a longer length to stock_feet or make the house smaller."
    )
);

function shown(layer) =
    layer == "floor" ? show_floor
    : layer == "subfloor" ? show_subfloor
    : layer == "walls" ? show_walls
    : layer == "roof" || layer == "ties" ? show_roof
    : show_roof_sheathing;

if (part == "house") {
    echo(str("The Tiny: ", length, " x ", width, " in, walls ", wall_height, " in, ", pitch, "/12 roof"));
    echo(str("Top plates at ", H_TOP, " in; ridge board (", RIDGE, ") top at ", round(RIDGE_TOP * 100) / 100, " in"));
    echo(str("Birdsmouth: seat ", round(SEAT * 100) / 100, " in, notch ", round(SEAT * pitch / 12 * 100) / 100, " in deep"));
    cut_list(MEMBERS, LENGTHS);
    if (list_members) for (m = MEMBERS) echo(str("MEMBER ", m));
    for (m = MEMBERS) if (shown(m[2])) draw(m);
}
else
    assert(part == "none", str("part must be house or none, not ", part));
// main file
// A 12' x 7' cabin with a 12/12 roof
// The house at a smaller size, with a steeper roof and an 18 in overhang.
include <../src/house.scad>

length = 144;
width = 84;
pitch = 12;
overhang = 18;
